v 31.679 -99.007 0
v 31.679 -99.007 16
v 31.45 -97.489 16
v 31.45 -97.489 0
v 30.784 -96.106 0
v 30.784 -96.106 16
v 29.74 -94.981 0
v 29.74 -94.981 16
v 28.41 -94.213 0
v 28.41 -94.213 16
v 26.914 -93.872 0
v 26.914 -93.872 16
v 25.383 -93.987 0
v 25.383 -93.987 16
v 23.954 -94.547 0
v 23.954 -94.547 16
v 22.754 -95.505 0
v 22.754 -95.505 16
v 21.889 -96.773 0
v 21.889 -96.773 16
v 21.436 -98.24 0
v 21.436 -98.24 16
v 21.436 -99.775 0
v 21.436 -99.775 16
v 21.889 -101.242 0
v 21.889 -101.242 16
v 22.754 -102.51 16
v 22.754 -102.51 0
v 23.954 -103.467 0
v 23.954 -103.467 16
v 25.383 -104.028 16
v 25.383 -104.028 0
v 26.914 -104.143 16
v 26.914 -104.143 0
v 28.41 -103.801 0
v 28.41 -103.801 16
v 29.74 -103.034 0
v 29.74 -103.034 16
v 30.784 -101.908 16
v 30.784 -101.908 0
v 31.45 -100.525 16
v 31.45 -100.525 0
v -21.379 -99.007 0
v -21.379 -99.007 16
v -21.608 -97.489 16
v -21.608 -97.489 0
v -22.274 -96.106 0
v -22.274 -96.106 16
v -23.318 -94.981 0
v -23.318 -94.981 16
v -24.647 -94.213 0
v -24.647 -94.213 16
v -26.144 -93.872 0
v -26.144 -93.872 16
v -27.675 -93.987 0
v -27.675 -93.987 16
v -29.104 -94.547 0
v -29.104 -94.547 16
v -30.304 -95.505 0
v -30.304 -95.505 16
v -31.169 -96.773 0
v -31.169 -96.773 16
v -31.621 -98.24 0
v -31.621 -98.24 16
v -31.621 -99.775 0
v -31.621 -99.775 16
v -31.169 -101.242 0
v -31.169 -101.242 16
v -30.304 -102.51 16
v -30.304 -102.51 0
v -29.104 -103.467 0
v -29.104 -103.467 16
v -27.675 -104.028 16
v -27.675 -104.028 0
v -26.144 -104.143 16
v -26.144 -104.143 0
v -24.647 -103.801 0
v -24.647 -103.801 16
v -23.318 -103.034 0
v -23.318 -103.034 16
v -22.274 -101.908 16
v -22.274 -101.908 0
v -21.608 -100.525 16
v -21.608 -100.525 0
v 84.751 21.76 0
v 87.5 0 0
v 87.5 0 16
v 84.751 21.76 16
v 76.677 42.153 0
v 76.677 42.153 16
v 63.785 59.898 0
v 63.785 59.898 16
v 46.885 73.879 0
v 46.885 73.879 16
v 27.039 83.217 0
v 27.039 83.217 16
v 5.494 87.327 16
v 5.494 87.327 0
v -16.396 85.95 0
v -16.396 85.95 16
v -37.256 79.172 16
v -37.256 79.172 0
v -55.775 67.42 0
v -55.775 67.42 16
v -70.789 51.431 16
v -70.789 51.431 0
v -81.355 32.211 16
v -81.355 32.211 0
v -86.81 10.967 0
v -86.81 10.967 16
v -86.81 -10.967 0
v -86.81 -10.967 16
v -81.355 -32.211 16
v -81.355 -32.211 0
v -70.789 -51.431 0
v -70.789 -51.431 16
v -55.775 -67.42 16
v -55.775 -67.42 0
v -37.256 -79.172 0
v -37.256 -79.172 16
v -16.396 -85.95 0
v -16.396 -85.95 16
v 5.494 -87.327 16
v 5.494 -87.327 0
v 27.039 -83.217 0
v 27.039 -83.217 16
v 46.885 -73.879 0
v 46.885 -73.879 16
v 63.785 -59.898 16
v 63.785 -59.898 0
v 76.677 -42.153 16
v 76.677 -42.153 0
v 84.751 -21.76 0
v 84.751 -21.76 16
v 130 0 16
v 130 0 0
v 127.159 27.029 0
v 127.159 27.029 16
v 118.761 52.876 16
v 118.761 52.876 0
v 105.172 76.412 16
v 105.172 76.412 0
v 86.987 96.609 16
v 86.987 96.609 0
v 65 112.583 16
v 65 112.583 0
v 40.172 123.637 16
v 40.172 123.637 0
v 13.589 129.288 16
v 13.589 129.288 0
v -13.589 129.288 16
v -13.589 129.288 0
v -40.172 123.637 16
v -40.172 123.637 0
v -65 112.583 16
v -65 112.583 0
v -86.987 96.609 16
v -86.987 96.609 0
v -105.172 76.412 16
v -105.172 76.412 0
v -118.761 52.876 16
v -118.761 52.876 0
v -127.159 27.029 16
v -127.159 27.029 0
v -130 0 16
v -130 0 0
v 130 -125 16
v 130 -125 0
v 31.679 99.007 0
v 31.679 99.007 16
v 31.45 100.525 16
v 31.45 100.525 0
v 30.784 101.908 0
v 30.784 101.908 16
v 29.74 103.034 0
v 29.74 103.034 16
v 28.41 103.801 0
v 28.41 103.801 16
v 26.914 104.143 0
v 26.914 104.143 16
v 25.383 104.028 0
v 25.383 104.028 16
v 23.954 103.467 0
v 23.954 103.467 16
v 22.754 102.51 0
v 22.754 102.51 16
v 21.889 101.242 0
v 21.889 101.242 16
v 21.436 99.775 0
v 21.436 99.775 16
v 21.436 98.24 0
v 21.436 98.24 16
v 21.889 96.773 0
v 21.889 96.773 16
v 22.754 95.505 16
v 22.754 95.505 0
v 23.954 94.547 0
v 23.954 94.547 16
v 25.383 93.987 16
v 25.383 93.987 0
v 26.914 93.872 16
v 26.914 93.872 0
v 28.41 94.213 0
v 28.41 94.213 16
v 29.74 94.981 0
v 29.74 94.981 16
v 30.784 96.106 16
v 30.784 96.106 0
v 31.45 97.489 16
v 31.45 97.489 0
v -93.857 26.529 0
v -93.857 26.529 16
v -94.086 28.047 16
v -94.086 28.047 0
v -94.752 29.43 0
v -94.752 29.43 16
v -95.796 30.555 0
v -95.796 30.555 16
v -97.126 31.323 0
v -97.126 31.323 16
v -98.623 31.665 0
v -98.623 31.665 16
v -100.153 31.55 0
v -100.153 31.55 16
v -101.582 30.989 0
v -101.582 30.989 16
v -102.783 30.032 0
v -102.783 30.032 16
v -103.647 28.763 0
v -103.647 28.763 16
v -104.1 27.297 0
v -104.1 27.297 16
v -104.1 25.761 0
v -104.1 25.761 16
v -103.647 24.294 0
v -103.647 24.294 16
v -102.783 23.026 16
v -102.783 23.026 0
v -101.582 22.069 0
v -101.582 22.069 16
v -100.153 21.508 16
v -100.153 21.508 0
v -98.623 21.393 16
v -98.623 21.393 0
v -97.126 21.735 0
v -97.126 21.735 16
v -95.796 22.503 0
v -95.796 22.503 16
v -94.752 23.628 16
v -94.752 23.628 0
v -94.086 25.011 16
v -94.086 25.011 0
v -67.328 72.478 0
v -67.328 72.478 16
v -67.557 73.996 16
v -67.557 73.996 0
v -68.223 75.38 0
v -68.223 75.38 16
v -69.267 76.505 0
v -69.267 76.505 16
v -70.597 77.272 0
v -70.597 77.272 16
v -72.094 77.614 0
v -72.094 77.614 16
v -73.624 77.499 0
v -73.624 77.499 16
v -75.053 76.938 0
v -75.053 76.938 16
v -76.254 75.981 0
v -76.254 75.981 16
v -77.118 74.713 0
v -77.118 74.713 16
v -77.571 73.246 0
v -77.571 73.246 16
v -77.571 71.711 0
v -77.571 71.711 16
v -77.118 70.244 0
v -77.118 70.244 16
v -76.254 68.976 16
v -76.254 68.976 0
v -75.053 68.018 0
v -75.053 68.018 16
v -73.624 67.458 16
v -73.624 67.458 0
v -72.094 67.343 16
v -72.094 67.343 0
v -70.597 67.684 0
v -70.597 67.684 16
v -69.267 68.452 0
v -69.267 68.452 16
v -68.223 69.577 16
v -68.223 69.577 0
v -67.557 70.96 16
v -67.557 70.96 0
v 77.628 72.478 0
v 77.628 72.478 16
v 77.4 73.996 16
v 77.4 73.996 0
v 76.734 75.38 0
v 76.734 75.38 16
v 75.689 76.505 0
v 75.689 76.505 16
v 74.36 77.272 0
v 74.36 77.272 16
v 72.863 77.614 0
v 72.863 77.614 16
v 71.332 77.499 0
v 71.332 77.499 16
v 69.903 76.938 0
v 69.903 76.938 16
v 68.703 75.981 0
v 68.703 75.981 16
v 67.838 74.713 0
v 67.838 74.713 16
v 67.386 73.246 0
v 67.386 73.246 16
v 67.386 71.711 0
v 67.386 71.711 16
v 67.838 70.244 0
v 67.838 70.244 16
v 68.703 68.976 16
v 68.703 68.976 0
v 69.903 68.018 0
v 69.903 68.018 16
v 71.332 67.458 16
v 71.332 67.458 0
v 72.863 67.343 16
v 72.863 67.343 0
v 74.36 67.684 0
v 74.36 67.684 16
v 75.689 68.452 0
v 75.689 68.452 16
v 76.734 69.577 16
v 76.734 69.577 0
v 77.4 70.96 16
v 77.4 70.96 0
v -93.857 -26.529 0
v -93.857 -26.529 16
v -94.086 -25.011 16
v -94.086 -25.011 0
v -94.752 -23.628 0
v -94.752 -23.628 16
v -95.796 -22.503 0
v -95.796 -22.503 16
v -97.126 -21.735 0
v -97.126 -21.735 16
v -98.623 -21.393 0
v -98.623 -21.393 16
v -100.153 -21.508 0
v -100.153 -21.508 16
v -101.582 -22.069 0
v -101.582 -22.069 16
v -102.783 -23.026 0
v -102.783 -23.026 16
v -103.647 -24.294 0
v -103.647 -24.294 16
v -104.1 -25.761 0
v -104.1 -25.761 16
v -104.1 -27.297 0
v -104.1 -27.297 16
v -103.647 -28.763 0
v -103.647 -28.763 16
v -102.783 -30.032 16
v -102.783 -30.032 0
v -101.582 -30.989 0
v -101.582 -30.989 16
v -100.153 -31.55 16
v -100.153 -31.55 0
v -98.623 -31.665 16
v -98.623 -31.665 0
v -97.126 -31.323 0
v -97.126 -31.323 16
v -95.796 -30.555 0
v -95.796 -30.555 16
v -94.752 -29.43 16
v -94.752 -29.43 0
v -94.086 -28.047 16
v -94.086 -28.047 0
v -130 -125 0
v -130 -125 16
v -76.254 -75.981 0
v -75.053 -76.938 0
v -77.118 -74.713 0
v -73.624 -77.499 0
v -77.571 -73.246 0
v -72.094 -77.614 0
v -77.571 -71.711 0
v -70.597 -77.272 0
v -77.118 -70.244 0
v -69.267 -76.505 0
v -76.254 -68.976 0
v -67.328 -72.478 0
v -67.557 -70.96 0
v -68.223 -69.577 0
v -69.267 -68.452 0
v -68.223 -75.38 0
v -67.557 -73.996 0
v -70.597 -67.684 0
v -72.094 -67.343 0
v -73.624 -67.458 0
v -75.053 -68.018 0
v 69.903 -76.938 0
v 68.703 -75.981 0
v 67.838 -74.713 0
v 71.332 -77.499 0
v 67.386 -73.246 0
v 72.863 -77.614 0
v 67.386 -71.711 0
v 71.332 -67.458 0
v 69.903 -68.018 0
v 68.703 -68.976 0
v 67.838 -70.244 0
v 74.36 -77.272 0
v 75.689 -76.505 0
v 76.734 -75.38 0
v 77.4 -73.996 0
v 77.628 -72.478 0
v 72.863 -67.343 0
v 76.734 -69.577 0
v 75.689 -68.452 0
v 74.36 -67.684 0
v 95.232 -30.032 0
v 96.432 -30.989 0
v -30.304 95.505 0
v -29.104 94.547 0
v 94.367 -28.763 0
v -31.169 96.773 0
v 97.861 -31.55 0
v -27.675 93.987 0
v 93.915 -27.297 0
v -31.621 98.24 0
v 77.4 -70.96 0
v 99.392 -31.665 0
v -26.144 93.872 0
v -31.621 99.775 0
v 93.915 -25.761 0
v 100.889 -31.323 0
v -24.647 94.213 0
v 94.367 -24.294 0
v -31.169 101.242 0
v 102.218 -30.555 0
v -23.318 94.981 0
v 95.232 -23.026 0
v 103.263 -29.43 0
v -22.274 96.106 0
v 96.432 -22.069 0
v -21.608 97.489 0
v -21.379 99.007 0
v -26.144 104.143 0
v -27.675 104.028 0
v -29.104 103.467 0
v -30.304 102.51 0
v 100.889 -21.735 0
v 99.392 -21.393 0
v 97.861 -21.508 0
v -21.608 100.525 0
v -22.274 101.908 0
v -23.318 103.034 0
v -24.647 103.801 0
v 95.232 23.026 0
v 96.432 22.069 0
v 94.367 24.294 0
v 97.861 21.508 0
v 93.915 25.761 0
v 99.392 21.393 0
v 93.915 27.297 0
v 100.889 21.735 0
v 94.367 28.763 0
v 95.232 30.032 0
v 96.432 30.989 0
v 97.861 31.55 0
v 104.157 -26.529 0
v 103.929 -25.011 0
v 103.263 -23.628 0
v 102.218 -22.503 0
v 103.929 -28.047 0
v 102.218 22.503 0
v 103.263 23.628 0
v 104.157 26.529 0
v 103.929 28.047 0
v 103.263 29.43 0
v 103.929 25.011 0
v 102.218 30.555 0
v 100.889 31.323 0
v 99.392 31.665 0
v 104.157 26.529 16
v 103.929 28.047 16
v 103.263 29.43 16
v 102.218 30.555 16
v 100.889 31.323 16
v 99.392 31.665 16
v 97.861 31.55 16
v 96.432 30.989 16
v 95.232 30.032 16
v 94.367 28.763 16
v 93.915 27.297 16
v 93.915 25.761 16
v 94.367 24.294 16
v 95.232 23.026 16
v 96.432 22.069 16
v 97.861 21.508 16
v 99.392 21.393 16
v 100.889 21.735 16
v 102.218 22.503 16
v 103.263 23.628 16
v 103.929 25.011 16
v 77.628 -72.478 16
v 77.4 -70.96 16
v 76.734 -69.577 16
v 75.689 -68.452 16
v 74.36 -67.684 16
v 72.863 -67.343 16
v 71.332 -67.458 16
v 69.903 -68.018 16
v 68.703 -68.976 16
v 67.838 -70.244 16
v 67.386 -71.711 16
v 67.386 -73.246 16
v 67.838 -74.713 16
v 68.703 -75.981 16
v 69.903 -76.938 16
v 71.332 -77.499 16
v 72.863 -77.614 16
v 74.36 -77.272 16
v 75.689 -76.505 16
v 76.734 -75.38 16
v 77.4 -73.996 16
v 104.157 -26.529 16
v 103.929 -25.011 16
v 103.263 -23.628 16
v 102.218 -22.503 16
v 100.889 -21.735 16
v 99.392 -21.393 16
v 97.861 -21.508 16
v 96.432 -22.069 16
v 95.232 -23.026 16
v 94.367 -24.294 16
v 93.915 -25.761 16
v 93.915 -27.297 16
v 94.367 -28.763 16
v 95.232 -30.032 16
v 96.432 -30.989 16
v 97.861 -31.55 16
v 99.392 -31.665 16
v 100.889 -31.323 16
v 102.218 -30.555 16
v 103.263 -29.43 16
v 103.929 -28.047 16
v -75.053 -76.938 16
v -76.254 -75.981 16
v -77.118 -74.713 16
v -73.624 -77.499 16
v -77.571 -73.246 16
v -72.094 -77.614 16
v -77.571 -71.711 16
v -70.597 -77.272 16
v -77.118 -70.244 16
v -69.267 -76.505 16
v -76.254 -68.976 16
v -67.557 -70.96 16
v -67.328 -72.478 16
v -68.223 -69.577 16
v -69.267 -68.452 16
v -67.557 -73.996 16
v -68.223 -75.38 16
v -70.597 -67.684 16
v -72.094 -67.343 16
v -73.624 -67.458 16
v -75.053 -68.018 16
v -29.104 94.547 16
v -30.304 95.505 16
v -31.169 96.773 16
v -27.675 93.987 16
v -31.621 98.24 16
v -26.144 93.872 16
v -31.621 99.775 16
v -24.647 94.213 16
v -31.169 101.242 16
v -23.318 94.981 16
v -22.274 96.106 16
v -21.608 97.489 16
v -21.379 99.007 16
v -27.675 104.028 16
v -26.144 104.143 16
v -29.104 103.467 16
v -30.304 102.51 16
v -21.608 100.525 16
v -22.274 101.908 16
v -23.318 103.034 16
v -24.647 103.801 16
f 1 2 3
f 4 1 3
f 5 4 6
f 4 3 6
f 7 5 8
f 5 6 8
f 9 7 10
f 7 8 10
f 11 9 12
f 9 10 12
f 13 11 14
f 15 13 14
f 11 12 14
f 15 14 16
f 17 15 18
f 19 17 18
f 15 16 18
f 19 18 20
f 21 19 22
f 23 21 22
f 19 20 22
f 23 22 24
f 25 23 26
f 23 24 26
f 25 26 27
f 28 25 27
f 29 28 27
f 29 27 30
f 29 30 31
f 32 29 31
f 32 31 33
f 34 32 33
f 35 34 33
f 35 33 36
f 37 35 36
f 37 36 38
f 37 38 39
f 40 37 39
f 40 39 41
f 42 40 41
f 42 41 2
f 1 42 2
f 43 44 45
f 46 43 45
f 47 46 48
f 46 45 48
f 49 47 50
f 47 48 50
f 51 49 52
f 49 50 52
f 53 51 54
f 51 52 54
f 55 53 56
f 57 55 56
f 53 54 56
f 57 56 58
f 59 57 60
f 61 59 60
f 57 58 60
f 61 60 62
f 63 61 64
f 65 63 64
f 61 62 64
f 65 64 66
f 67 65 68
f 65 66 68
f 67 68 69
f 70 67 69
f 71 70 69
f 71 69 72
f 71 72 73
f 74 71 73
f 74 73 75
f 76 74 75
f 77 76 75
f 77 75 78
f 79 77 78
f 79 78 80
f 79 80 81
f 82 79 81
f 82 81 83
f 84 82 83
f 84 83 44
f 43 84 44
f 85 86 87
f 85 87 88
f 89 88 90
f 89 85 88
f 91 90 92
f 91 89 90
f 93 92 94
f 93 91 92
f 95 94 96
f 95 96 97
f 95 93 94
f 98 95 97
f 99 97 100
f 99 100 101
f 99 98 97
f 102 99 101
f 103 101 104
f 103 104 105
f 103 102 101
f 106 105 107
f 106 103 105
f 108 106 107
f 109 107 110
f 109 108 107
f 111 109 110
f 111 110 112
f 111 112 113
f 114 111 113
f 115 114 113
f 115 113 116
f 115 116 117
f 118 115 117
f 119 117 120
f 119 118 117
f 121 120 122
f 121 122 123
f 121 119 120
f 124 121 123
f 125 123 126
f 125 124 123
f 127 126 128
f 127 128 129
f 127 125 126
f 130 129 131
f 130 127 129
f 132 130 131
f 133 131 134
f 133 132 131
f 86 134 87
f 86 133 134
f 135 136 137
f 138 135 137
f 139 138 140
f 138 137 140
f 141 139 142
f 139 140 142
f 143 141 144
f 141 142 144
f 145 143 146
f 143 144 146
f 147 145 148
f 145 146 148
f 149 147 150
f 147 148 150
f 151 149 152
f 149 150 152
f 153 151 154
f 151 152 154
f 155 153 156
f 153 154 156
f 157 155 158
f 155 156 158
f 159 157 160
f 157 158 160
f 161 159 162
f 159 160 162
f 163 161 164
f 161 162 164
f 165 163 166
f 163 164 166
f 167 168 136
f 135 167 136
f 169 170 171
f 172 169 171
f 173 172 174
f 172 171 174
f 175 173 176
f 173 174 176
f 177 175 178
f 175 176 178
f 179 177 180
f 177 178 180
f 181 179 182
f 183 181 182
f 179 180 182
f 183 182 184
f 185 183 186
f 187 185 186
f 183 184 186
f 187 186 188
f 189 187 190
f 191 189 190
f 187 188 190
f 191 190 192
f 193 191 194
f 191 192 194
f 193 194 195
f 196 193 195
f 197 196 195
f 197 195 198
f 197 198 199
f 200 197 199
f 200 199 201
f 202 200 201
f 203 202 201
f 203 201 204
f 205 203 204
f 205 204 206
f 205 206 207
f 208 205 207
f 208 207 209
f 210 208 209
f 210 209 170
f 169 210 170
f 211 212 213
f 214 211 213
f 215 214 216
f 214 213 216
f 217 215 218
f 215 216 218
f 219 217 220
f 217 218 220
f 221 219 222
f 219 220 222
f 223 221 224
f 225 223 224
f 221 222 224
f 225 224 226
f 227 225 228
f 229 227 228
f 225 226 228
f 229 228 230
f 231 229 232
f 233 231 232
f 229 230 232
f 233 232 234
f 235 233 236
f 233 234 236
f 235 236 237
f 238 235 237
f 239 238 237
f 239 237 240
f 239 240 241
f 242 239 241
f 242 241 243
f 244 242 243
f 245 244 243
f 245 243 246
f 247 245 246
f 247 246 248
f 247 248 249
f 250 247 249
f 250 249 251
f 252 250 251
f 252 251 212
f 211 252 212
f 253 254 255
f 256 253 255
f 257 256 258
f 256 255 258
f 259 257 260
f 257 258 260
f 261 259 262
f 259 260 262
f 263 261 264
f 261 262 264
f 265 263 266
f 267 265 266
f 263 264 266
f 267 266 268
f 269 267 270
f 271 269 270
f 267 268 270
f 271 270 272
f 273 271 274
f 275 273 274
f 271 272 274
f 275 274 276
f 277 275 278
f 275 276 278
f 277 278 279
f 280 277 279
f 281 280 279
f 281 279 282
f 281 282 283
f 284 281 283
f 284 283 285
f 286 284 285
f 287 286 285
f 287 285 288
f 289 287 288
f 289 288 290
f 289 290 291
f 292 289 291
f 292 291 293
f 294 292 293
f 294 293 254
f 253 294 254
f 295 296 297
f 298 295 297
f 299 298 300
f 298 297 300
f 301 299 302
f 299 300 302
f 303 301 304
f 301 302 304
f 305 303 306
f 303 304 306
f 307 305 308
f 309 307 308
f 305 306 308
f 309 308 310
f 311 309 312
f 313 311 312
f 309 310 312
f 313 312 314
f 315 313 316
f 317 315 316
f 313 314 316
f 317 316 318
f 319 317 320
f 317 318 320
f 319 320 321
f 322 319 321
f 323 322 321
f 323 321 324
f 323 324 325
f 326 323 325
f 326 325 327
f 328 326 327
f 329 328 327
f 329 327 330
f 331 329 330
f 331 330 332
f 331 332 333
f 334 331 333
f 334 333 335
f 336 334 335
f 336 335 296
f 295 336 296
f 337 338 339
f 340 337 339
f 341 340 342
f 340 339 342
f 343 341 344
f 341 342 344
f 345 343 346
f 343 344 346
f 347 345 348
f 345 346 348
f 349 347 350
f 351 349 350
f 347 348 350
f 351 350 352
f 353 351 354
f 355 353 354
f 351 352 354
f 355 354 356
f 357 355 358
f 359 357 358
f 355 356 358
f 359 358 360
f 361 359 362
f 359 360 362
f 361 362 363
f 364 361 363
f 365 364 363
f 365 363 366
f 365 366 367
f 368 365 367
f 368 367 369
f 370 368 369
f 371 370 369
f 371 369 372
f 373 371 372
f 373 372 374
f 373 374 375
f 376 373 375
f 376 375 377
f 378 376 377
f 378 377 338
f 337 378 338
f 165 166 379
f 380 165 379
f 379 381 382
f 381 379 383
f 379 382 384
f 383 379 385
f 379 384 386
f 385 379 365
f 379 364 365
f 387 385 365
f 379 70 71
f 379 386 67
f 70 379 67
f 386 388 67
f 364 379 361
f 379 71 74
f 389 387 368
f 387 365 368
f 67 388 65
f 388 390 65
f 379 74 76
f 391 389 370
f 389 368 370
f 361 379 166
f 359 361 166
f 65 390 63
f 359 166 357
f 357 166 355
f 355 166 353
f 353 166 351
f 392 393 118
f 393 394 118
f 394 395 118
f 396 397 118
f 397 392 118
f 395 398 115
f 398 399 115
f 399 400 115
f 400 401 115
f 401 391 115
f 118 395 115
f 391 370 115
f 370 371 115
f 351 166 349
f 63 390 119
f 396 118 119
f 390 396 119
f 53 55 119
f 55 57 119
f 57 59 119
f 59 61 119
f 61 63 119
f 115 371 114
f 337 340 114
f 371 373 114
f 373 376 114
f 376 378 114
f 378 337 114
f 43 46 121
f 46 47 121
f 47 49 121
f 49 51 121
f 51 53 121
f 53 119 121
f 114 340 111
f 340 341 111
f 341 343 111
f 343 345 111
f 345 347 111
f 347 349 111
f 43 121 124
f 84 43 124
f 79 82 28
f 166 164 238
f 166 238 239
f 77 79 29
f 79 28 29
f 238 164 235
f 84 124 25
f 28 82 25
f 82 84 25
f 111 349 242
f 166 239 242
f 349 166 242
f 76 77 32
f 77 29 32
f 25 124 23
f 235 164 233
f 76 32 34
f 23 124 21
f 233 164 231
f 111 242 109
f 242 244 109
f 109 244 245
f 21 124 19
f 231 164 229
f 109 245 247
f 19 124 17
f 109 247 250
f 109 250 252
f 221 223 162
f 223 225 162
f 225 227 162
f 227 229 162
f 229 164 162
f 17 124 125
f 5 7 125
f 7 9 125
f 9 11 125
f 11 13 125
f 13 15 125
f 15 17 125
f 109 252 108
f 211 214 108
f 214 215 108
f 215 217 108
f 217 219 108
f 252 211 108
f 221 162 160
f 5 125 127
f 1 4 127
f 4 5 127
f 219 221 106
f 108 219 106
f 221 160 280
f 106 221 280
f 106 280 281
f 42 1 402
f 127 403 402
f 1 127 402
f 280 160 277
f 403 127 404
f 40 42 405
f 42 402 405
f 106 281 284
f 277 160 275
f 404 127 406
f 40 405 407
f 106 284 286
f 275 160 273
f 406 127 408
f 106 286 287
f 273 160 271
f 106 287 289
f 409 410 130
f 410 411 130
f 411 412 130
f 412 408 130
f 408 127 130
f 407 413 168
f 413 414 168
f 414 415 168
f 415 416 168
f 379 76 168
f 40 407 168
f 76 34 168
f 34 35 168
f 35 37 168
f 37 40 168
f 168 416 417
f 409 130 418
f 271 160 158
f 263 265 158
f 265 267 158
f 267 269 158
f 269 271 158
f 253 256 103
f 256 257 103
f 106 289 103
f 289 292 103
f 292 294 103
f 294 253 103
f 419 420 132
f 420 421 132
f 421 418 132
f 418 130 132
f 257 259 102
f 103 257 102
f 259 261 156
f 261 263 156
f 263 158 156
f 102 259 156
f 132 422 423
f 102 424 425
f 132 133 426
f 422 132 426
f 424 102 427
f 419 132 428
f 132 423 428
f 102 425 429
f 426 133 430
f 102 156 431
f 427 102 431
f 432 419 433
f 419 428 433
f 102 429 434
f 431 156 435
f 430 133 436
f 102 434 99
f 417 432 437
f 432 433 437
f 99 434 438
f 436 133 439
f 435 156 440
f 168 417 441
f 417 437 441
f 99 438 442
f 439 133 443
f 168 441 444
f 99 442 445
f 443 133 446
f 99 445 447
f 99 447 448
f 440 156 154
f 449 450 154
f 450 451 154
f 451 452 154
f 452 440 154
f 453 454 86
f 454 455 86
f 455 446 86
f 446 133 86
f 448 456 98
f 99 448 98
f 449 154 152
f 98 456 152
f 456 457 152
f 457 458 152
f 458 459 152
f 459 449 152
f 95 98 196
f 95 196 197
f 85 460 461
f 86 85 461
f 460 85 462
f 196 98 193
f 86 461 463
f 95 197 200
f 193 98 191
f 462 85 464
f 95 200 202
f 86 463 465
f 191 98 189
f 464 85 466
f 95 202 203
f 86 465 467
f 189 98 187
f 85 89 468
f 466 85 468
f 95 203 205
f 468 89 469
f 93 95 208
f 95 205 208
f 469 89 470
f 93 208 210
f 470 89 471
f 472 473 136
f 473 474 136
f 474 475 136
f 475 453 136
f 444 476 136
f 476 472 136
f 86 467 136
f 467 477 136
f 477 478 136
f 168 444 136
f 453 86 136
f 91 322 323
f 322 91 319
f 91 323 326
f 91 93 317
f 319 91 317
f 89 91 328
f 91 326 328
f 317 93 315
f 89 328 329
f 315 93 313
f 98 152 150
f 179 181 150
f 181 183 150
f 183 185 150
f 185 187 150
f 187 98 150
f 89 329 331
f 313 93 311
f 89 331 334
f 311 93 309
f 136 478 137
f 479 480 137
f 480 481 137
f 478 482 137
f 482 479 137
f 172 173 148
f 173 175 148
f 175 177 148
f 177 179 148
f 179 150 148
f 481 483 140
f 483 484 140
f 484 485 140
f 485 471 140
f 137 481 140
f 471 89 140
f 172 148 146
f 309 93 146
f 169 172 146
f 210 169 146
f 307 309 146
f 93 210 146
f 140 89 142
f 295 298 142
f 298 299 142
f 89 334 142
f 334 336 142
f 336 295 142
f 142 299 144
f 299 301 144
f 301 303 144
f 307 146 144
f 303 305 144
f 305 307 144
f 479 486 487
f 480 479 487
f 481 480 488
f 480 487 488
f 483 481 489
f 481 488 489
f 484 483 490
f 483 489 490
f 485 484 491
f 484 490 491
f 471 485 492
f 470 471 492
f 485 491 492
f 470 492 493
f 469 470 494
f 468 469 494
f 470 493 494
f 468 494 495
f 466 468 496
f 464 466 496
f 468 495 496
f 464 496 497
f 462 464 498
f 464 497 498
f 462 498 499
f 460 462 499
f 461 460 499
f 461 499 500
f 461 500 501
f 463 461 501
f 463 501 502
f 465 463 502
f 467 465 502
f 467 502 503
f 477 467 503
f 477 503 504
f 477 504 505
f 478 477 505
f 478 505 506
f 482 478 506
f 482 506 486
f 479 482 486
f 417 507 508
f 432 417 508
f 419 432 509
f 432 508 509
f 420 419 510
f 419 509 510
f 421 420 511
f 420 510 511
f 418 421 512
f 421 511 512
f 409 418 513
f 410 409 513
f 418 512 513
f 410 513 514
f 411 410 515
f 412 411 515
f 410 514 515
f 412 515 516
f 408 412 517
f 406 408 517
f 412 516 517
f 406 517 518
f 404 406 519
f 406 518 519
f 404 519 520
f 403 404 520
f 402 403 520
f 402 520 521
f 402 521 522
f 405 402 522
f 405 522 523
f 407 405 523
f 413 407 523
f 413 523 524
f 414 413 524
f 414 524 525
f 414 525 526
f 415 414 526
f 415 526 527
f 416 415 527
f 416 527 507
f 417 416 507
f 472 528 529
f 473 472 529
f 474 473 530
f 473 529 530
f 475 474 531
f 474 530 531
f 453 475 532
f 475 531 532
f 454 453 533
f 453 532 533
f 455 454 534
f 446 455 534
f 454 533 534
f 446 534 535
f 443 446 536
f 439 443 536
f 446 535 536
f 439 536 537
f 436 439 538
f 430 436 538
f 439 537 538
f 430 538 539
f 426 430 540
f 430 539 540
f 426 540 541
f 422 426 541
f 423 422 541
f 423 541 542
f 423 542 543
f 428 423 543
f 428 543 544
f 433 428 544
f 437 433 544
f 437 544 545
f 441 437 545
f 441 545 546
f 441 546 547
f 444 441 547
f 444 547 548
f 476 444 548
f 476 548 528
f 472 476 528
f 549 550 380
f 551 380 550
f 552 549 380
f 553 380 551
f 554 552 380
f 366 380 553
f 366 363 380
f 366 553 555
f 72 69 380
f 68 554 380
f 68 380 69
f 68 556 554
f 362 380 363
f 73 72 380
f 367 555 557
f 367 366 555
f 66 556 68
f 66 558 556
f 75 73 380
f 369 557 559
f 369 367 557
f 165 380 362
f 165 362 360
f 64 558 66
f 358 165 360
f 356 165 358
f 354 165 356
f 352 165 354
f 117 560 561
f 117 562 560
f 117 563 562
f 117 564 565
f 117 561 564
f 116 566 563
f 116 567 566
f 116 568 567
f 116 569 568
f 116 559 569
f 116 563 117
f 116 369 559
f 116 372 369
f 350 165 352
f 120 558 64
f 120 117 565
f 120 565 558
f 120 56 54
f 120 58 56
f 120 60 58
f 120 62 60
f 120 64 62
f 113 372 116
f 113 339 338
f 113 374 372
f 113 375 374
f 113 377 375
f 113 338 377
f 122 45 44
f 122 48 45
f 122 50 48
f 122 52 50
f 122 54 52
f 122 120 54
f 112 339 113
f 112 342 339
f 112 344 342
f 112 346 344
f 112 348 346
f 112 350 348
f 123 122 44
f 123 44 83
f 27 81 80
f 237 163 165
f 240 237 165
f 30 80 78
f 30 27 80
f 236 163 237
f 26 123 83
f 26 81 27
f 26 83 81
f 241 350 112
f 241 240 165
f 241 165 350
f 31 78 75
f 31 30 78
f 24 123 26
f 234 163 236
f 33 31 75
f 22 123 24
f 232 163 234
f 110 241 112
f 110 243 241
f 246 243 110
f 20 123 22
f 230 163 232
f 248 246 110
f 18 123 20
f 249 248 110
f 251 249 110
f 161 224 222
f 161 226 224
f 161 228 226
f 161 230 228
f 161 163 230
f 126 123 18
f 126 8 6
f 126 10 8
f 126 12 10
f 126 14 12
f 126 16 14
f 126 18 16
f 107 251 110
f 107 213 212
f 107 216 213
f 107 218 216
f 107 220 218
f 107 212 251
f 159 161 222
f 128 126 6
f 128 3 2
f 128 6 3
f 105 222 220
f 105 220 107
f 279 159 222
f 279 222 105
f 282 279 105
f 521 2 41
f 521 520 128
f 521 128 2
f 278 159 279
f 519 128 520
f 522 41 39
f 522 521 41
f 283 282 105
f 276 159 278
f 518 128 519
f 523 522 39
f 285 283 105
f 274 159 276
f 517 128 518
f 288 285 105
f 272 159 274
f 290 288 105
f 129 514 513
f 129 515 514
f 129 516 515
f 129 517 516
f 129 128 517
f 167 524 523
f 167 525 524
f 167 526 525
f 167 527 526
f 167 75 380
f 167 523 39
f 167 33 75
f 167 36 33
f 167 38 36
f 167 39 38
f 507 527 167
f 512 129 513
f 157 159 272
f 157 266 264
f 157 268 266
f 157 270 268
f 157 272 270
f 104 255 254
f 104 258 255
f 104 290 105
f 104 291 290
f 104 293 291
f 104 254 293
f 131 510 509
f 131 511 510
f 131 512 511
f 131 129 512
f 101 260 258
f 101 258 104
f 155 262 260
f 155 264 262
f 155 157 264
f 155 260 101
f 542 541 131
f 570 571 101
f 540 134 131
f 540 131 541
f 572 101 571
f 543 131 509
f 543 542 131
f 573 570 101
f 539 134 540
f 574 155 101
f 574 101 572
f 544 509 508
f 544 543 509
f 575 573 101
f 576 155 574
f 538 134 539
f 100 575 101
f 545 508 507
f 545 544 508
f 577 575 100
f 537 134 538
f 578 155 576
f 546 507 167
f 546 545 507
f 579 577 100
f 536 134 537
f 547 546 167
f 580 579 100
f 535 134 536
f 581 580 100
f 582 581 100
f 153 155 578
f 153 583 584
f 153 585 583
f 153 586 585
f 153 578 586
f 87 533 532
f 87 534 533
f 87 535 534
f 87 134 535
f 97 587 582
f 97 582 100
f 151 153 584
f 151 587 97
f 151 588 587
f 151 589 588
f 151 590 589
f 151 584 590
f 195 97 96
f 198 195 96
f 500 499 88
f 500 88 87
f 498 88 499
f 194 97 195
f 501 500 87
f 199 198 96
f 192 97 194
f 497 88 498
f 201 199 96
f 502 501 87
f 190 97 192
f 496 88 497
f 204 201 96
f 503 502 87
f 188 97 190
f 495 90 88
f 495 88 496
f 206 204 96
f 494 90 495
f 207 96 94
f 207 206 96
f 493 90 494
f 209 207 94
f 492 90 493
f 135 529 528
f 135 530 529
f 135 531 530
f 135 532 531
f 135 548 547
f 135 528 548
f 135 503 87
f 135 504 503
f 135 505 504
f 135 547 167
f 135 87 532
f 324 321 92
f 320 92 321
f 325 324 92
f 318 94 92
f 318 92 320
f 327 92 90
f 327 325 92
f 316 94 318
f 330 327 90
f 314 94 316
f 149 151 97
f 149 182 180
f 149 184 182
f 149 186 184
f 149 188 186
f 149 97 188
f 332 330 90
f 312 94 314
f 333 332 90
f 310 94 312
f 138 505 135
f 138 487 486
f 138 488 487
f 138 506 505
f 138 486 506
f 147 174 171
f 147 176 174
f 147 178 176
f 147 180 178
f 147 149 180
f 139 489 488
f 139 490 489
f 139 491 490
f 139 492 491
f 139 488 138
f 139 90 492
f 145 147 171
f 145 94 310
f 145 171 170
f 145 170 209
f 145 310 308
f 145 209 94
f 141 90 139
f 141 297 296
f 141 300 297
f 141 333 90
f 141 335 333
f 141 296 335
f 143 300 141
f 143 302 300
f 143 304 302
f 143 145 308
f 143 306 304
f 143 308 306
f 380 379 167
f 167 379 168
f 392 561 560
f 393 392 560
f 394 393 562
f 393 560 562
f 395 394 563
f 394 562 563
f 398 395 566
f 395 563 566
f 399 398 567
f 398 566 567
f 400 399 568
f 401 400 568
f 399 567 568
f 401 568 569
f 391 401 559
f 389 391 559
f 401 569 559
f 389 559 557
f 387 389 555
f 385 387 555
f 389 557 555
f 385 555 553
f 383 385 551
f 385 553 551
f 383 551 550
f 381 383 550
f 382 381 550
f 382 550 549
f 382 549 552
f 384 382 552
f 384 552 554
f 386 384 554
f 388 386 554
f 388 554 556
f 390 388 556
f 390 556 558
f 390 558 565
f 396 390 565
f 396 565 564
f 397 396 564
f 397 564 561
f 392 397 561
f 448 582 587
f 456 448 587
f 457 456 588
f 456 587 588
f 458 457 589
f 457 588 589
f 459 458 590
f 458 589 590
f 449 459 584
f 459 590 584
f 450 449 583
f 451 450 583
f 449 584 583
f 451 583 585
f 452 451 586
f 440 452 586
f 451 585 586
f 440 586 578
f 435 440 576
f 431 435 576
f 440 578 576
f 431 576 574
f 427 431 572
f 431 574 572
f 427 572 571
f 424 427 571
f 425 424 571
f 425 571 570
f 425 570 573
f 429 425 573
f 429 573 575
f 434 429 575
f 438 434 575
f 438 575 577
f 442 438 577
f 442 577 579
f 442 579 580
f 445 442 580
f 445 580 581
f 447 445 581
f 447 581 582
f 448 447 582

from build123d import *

# Parameters (mm, degrees)
SKETCH_1_R          = 87.5
EXTRUDE_1_DEPTH     = 16
CUT_EXTRUDE_1_REACH = 186.543
SKETCH_2_R          = 5.15


with BuildPart() as part:
    # 草图1 → 凸台-拉伸1 (new body)
    with BuildSketch(Plane.XY):
        with BuildLine():
            Line((-130, 0), (-130, -125))
            Line((-130, -125), (130, -125))
            Line((130, -125), (130, 0))
            ThreePointArc((130, 0), (0, 130), (-130, 0))
        make_face()
        Circle(SKETCH_1_R, mode=Mode.SUBTRACT)
    extrude(amount=EXTRUDE_1_DEPTH)

    # 草图2 → 切除-拉伸1 (cut, up to next)
    with BuildSketch(Plane.XY.offset(16), mode=Mode.PRIVATE) as cut_extrude_1_sk1:
        with Locations((-26.528952123, 99.007397195)):
            Circle(SKETCH_2_R)
    cut_extrude_1_tool1 = extrude(cut_extrude_1_sk1.sketch, amount=-CUT_EXTRUDE_1_REACH, mode=Mode.PRIVATE) & part.part
    # 草图2 → 切除-拉伸1 (cut, up to next)
    with BuildSketch(Plane.XY.offset(16), mode=Mode.PRIVATE) as cut_extrude_1_sk2:
        with Locations((26.528952123, 99.007397195)):
            Circle(SKETCH_2_R)
    cut_extrude_1_tool2 = extrude(cut_extrude_1_sk2.sketch, amount=-CUT_EXTRUDE_1_REACH, mode=Mode.PRIVATE) & part.part
    # 草图2 → 切除-拉伸1 (cut, up to next)
    with BuildSketch(Plane.XY.offset(16), mode=Mode.PRIVATE) as cut_extrude_1_sk3:
        with Locations((72.478445072, 72.478445072)):
            Circle(SKETCH_2_R)
    cut_extrude_1_tool3 = extrude(cut_extrude_1_sk3.sketch, amount=-CUT_EXTRUDE_1_REACH, mode=Mode.PRIVATE) & part.part
    # 草图2 → 切除-拉伸1 (cut, up to next)
    with BuildSketch(Plane.XY.offset(16), mode=Mode.PRIVATE) as cut_extrude_1_sk4:
        with Locations((99.007397195, 26.528952123)):
            Circle(SKETCH_2_R)
    cut_extrude_1_tool4 = extrude(cut_extrude_1_sk4.sketch, amount=-CUT_EXTRUDE_1_REACH, mode=Mode.PRIVATE) & part.part
    # 草图2 → 切除-拉伸1 (cut, up to next)
    with BuildSketch(Plane.XY.offset(16), mode=Mode.PRIVATE) as cut_extrude_1_sk5:
        with Locations((99.007397195, -26.528952123)):
            Circle(SKETCH_2_R)
    cut_extrude_1_tool5 = extrude(cut_extrude_1_sk5.sketch, amount=-CUT_EXTRUDE_1_REACH, mode=Mode.PRIVATE) & part.part
    # 草图2 → 切除-拉伸1 (cut, up to next)
    with BuildSketch(Plane.XY.offset(16), mode=Mode.PRIVATE) as cut_extrude_1_sk6:
        with Locations((72.478445072, -72.478445072)):
            Circle(SKETCH_2_R)
    cut_extrude_1_tool6 = extrude(cut_extrude_1_sk6.sketch, amount=-CUT_EXTRUDE_1_REACH, mode=Mode.PRIVATE) & part.part
    # 草图2 → 切除-拉伸1 (cut, up to next)
    with BuildSketch(Plane.XY.offset(16), mode=Mode.PRIVATE) as cut_extrude_1_sk7:
        with Locations((26.528952123, -99.007397195)):
            Circle(SKETCH_2_R)
    cut_extrude_1_tool7 = extrude(cut_extrude_1_sk7.sketch, amount=-CUT_EXTRUDE_1_REACH, mode=Mode.PRIVATE) & part.part
    # 草图2 → 切除-拉伸1 (cut, up to next)
    with BuildSketch(Plane.XY.offset(16), mode=Mode.PRIVATE) as cut_extrude_1_sk8:
        with Locations((-26.528952123, -99.007397195)):
            Circle(SKETCH_2_R)
    cut_extrude_1_tool8 = extrude(cut_extrude_1_sk8.sketch, amount=-CUT_EXTRUDE_1_REACH, mode=Mode.PRIVATE) & part.part
    # 草图2 → 切除-拉伸1 (cut, up to next)
    with BuildSketch(Plane.XY.offset(16), mode=Mode.PRIVATE) as cut_extrude_1_sk9:
        with Locations((-72.478445072, -72.478445072)):
            Circle(SKETCH_2_R)
    cut_extrude_1_tool9 = extrude(cut_extrude_1_sk9.sketch, amount=-CUT_EXTRUDE_1_REACH, mode=Mode.PRIVATE) & part.part
    # 草图2 → 切除-拉伸1 (cut, up to next)
    with BuildSketch(Plane.XY.offset(16), mode=Mode.PRIVATE) as cut_extrude_1_sk10:
        with Locations((-99.007397195, -26.528952123)):
            Circle(SKETCH_2_R)
    cut_extrude_1_tool10 = extrude(cut_extrude_1_sk10.sketch, amount=-CUT_EXTRUDE_1_REACH, mode=Mode.PRIVATE) & part.part
    # 草图2 → 切除-拉伸1 (cut, up to next)
    with BuildSketch(Plane.XY.offset(16), mode=Mode.PRIVATE) as cut_extrude_1_sk11:
        with Locations((-99.007397195, 26.528952123)):
            Circle(SKETCH_2_R)
    cut_extrude_1_tool11 = extrude(cut_extrude_1_sk11.sketch, amount=-CUT_EXTRUDE_1_REACH, mode=Mode.PRIVATE) & part.part
    # 草图2 → 切除-拉伸1 (cut, up to next)
    with BuildSketch(Plane.XY.offset(16), mode=Mode.PRIVATE) as cut_extrude_1_sk12:
        with Locations((-72.478445072, 72.478445072)):
            Circle(SKETCH_2_R)
    cut_extrude_1_tool12 = extrude(cut_extrude_1_sk12.sketch, amount=-CUT_EXTRUDE_1_REACH, mode=Mode.PRIVATE) & part.part
    add(cut_extrude_1_tool1.solids().sort_by_distance((-26.528952, 99.007397, 16))[0], mode=Mode.SUBTRACT)
    add(cut_extrude_1_tool2.solids().sort_by_distance((26.528952, 99.007397, 16))[0], mode=Mode.SUBTRACT)
    add(cut_extrude_1_tool3.solids().sort_by_distance((72.478445, 72.478445, 16))[0], mode=Mode.SUBTRACT)
    add(cut_extrude_1_tool4.solids().sort_by_distance((99.007397, 26.528952, 16))[0], mode=Mode.SUBTRACT)
    add(cut_extrude_1_tool5.solids().sort_by_distance((99.007397, -26.528952, 16))[0], mode=Mode.SUBTRACT)
    add(cut_extrude_1_tool6.solids().sort_by_distance((72.478445, -72.478445, 16))[0], mode=Mode.SUBTRACT)
    add(cut_extrude_1_tool7.solids().sort_by_distance((26.528952, -99.007397, 16))[0], mode=Mode.SUBTRACT)
    add(cut_extrude_1_tool8.solids().sort_by_distance((-26.528952, -99.007397, 16))[0], mode=Mode.SUBTRACT)
    add(cut_extrude_1_tool9.solids().sort_by_distance((-72.478445, -72.478445, 16))[0], mode=Mode.SUBTRACT)
    add(cut_extrude_1_tool10.solids().sort_by_distance((-99.007397, -26.528952, 16))[0], mode=Mode.SUBTRACT)
    add(cut_extrude_1_tool11.solids().sort_by_distance((-99.007397, 26.528952, 16))[0], mode=Mode.SUBTRACT)
    add(cut_extrude_1_tool12.solids().sort_by_distance((-72.478445, 72.478445, 16))[0], mode=Mode.SUBTRACT)


solid = part.part
